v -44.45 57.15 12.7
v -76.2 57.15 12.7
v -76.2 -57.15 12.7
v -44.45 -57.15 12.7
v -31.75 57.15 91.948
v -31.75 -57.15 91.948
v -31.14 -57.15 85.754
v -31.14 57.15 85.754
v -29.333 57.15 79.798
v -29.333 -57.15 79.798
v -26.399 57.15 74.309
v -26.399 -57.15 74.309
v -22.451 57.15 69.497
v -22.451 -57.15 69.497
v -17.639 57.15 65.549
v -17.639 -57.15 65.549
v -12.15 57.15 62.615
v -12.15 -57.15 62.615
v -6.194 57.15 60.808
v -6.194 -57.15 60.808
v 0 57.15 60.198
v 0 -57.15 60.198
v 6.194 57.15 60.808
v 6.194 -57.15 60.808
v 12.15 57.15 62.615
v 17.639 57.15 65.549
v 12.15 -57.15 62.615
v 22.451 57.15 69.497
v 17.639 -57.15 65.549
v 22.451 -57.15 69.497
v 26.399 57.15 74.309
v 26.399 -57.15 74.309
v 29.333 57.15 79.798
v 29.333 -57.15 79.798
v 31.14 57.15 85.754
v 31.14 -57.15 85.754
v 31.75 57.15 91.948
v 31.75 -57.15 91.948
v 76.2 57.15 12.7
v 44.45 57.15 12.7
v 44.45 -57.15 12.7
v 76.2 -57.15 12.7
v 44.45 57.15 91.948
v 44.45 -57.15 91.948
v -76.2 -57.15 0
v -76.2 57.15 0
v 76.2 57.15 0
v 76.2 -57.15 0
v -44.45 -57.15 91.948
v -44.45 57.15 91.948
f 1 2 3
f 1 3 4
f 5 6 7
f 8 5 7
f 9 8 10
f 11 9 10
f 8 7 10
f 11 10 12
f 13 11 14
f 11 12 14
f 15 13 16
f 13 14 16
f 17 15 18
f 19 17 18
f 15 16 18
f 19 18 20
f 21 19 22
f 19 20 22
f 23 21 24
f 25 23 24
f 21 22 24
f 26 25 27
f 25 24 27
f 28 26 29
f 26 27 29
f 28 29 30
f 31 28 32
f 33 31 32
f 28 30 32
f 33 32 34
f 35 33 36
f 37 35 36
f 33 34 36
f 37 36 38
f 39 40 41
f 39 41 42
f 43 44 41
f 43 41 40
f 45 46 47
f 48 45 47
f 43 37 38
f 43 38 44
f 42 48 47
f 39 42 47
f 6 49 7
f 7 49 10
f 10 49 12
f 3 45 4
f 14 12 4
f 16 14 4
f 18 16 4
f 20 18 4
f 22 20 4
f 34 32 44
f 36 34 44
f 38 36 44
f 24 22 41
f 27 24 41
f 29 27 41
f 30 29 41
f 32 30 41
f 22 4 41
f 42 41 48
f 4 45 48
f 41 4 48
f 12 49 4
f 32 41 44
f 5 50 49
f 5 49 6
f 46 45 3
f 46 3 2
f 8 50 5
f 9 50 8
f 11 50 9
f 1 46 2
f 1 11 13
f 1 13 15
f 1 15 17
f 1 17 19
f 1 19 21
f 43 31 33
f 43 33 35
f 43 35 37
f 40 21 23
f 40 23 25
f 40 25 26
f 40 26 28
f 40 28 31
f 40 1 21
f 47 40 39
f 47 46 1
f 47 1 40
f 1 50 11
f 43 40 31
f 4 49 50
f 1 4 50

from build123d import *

# Parameters (mm, degrees)
F0_W     = 152.4
F0_H     = 114.3
F1_DEPTH = 91.948
F3_DEPTH = 175.38727
F4_W     = 31.75
F4_H     = 114.3
F5_DEPTH = 79.248
F6_W     = 31.75
F6_H     = 114.3
F7_DEPTH = 79.248


with BuildPart() as f1:
    # F0 (on Top) → F1 (new body)
    with BuildSketch(Plane.XY):
        Rectangle(F0_W, F0_H)
    extrude(amount=F1_DEPTH)

    # F2 (on face) → F3 (cut)
    with BuildSketch(Plane.XZ.offset(57.15)):
        with BuildLine():
            Line((31.75, 91.948), (-31.75, 91.948))
            ThreePointArc((-31.75, 91.948), (0, 60.198), (31.75, 91.948))
        make_face()
    extrude(amount=-F3_DEPTH, mode=Mode.SUBTRACT)

    # F4 (on face) → F5 (cut)
    with BuildSketch(Plane.XY.offset(91.948)):
        with Locations((60.325, 0)):
            Rectangle(F4_W, F4_H)
    extrude(amount=-F5_DEPTH, mode=Mode.SUBTRACT)

    # F6 (on face) → F7 (cut)
    with BuildSketch(Plane.XY.offset(91.948)):
        with Locations((-60.325, 0)):
            Rectangle(F6_W, F6_H)
    extrude(amount=-F7_DEPTH, mode=Mode.SUBTRACT)


solid = f1.part
